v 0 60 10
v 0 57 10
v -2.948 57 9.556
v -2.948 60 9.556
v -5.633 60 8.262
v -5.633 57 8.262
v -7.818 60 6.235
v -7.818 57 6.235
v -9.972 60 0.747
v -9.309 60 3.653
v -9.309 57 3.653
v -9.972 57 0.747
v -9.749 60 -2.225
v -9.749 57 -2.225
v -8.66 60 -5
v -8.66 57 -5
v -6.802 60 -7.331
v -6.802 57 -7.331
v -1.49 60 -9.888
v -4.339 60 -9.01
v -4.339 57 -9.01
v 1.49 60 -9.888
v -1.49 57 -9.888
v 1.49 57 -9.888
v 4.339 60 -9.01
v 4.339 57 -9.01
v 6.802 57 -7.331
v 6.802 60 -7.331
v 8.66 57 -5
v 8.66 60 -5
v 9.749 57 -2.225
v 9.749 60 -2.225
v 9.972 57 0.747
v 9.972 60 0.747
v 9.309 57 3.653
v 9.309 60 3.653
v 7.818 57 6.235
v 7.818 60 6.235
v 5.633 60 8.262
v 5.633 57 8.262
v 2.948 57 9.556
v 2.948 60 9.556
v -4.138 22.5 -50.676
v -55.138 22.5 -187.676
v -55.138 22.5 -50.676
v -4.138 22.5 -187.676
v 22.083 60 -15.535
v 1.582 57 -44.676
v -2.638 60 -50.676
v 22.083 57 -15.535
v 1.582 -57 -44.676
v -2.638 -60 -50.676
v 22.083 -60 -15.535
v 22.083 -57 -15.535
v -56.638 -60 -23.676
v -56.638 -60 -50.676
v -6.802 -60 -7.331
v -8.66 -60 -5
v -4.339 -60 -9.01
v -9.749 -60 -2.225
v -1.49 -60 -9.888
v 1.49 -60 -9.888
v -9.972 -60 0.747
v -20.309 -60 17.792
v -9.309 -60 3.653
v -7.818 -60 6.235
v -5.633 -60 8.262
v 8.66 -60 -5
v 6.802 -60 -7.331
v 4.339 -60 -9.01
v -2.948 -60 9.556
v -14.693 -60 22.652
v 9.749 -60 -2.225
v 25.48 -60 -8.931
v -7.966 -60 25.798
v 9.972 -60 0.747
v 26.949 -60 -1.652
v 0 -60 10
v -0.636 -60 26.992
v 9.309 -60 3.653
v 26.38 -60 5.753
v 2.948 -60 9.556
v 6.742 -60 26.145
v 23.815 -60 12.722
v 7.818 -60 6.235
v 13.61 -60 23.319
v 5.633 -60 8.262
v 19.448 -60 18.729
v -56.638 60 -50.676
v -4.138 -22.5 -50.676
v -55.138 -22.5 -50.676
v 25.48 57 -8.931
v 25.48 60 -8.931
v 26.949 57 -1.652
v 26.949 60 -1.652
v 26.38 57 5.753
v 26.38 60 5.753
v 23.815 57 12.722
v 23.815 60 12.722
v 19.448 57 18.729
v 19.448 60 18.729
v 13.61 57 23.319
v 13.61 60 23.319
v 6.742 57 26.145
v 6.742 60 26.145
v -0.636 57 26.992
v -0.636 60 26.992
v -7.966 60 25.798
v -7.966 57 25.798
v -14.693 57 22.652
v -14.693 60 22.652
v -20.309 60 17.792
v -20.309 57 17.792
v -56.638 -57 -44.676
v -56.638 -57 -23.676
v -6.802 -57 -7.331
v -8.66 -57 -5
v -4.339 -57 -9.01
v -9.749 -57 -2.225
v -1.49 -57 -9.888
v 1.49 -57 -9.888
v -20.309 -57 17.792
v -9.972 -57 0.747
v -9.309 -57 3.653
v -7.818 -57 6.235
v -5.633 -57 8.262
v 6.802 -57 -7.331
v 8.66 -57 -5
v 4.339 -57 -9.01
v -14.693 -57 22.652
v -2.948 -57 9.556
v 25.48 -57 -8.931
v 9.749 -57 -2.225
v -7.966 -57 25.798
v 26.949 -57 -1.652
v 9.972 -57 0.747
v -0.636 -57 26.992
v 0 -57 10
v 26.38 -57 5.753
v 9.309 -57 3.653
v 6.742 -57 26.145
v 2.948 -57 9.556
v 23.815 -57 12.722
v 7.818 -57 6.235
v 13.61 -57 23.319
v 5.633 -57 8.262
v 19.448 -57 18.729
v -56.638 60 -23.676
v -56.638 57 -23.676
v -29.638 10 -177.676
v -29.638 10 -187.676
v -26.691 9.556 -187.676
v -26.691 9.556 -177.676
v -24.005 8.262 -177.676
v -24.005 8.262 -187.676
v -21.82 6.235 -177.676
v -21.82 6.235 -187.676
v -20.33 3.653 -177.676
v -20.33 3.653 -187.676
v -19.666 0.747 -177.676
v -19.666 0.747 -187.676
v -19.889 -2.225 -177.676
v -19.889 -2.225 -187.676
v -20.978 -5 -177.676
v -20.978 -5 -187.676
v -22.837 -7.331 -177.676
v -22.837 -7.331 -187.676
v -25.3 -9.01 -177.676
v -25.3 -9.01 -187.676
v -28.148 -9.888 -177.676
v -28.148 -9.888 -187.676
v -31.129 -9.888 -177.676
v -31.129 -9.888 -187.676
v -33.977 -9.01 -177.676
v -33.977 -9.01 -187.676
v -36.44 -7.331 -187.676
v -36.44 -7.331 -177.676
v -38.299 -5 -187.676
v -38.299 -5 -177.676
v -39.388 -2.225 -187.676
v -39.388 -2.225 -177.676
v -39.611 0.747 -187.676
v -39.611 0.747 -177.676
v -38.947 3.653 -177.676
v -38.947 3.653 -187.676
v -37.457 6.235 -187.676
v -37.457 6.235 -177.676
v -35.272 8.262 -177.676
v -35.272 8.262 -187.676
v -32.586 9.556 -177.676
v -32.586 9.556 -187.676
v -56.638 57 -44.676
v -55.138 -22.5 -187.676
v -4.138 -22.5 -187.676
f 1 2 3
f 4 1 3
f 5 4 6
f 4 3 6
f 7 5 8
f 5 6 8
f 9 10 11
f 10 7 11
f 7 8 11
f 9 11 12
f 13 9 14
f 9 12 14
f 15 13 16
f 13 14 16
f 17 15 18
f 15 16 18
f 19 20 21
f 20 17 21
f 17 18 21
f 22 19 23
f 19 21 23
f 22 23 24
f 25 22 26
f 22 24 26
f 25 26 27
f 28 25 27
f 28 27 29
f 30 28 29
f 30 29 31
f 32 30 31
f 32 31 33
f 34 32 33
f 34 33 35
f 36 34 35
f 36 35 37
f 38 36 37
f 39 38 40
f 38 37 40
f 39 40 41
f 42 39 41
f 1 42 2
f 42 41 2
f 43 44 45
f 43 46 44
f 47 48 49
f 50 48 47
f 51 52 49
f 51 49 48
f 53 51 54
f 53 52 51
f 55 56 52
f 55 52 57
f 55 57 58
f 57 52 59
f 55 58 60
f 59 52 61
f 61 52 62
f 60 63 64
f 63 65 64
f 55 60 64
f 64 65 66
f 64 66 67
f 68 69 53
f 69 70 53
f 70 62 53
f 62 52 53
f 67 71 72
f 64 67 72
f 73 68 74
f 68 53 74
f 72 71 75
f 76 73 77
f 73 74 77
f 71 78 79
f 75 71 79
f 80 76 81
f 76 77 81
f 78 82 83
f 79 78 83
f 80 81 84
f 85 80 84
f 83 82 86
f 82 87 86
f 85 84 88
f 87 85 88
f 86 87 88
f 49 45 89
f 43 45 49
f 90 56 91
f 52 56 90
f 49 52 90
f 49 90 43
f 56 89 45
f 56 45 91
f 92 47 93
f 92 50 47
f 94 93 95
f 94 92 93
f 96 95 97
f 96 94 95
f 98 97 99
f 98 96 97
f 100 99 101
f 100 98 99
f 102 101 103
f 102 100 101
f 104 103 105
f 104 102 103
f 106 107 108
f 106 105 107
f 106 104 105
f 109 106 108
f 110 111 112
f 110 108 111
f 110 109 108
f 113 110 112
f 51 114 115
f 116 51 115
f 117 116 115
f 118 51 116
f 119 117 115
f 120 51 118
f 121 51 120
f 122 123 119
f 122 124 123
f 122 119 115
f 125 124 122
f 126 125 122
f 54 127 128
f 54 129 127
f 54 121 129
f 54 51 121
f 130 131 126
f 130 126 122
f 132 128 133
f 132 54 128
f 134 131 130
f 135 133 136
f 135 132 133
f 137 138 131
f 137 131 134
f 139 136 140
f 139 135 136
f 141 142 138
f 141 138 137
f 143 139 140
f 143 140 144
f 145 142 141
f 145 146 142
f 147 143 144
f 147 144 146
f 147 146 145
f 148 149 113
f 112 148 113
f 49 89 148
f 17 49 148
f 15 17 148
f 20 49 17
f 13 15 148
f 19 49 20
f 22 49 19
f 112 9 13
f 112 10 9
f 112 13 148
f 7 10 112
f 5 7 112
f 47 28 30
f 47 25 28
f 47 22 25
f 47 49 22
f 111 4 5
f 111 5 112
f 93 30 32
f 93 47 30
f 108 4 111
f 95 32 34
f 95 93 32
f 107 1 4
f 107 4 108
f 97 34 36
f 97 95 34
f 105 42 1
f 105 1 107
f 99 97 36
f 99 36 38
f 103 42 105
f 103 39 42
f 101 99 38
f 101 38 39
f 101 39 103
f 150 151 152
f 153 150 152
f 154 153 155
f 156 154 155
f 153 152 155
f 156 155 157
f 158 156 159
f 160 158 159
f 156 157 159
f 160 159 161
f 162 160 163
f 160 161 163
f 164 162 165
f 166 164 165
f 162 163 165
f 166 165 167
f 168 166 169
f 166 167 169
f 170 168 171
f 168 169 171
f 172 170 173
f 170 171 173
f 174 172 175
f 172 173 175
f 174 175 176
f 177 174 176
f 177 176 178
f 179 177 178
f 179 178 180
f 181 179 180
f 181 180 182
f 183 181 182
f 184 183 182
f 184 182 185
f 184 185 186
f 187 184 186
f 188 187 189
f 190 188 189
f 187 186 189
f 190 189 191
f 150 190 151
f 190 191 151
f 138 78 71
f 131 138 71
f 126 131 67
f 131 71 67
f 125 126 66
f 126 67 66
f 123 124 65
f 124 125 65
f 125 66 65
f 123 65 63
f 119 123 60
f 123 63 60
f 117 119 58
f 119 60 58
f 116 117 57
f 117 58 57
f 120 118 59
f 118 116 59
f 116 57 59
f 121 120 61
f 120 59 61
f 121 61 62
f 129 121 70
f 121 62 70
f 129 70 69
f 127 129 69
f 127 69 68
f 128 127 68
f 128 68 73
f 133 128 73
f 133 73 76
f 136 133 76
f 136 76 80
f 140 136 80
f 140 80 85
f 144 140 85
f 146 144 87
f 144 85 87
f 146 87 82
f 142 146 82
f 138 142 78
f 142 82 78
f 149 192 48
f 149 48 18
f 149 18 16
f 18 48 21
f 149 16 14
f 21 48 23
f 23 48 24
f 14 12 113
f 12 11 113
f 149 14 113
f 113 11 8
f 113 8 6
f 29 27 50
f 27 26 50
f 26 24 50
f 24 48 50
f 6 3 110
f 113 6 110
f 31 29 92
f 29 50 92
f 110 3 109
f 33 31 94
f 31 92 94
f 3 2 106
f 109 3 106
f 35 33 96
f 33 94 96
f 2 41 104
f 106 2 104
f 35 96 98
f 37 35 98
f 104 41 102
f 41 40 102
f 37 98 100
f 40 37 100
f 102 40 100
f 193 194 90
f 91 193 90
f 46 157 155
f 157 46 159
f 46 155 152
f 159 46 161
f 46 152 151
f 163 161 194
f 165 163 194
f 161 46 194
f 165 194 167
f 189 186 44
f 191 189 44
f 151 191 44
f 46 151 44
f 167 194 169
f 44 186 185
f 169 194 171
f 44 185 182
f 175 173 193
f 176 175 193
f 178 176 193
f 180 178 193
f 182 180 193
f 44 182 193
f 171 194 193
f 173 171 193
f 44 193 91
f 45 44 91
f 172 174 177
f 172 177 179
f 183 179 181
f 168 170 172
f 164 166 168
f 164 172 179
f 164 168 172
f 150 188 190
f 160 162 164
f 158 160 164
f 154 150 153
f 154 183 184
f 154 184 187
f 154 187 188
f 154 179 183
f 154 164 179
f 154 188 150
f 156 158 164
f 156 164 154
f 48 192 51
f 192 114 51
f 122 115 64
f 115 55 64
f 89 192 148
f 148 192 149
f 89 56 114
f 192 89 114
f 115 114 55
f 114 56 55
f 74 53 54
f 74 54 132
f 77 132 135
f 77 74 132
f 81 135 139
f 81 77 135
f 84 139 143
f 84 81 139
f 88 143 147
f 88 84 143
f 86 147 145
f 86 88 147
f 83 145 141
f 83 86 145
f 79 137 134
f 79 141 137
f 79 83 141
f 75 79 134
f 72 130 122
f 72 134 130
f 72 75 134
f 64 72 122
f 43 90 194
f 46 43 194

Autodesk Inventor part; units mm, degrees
ref_plane "YZ Plane" through (0, 0, 0) normal (1, 0, 0) x (0, 1, 0)
ref_plane "XZ Plane" through (0, 0, 0) normal (0, 1, 0) x (-1, 0, 0)
ref_plane "XY Plane" through (0, 0, 0) normal (0, 0, 1) x (1, 0, 0)
sketch "Sketch1" plane through (0, 0, 0) normal (1, 0, 0) x (0, 1, 0)
  circle A0 centre (0, 0) radius 10
  line L0 (0, 0) -> (-50.6762, -56.6385) construction
  line L1 (-50.6762, -56.6385) -> (-50.6762, -2.6385)
  line L2 (-50.6762, -56.6385) -> (-23.6762, -56.6385)
  arc A1 (17.7921, -20.3086) -> (-15.5352, 22.083) centre (0, 0) ccw
  line L3 (-50.6762, -2.6385) -> (-15.5352, 22.083)
  line L4 (-23.6762, -56.6385) -> (17.7921, -20.3086)
  dimension "d0" = 20
  dimension "d2" = 41.82
  dimension "d5" = 76
  dimension "d6" = 27
  dimension "d7" = 54
  dimension "d8" = 54
extrude "Extrusion1" add sketch "Sketch1" along normal mid plane 120
sketch "Sketch2" plane through (0, 0, 0) normal (1, 0, 0) x (0, 1, 0)
  circle A0 centre (0, 0) radius 10 projected
  line L0 (-50.6762, -2.6385) -> (-50.6762, -56.6385) projected
  line L1 (-50.6762, -56.6385) -> (-23.6762, -56.6385) projected
  line L2 (-23.6762, -56.6385) -> (17.7921, -20.3086) projected
  arc A1 (17.7921, -20.3086) -> (-15.5352, 22.083) centre (0, 0) ccw projected
  line L3 (-15.5352, 22.083) -> (-50.6762, -2.6385) projected
  line L4 (-44.6762, -56.6385) -> (-44.6762, 1.5825)
  line L5 (-44.6762, 1.5825) -> (-15.5352, 22.083)
  line L6 (-44.6762, -56.6385) -> (-23.6762, -56.6385)
  dimension "d11" = 6
extrude "Extrusion2" cut sketch "Sketch2" along normal mid plane 114 contours L3 A1 L2 L1 L4
sketch "Sketch3" plane through (0, 0, 0) normal (1, 0, 0) x (0, 1, 0)
  line L0 (-50.6762, -29.6385) -> (-80.5956, -29.6385) construction
  line L1 (-50.6762, -2.6385) -> (-50.6762, -56.6385) projected
  line L2 (-50.6762, -4.1385) -> (-187.6762, -4.1385)
  line L3 (-187.6762, -4.1385) -> (-187.6762, -55.1385)
  line L4 (-187.6762, -55.1385) -> (-50.6762, -55.1385)
  line L5 (-50.6762, -55.1385) -> (-50.6762, -4.1385)
  line L6 (-50.6762, -29.6385) -> (-187.6762, -29.6385) construction
  point P0 (0, 0)
  dimension "d14" = 51
  dimension "d16" = 137
extrude "Extrusion3" add sketch "Sketch3" along normal mid plane 45
sketch "Sketch5" plane through (-22.5, -187.6762, -55.1385) normal (0, -1, 0) x (1, 0, 0)
  line L0 (0, 51) -> (45, 0) construction
  circle A0 centre (22.5, 25.5) radius 10
  point P0 (22.5, 55.1385)
  dimension "d19" = 20
extrude "Extrusion4" cut sketch "Sketch5" against normal blind 10
move or copy body "Move Body6" bodies to move or copy 1 copy no rotation origin (0, 0, 0) rotation axis (1, 0, 0) rotation angle 90
move or copy body "Move Body7" bodies to move or copy 1 copy no rotation origin (0, 0, 0) rotation axis (0, 0, 1) rotation angle 90
properties part number "Elbow_Pitch"
